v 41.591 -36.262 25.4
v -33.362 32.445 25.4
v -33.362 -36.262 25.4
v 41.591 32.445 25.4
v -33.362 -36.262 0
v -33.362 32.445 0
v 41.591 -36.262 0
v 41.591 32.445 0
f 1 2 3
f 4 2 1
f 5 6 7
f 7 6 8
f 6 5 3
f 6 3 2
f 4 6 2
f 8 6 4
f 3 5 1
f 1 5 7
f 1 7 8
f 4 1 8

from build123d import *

# Parameters (mm, degrees)
F0_W     = 74.953612
F0_H     = 68.707474
F1_DEPTH = 25.4
F3_DEPTH = 25.4
F5_DEPTH = 25.4
F6_R     = 11.148412
F7_DEPTH = 25.4


with BuildPart() as f1:
    # F0 (on Top) → F1 (new body)
    with BuildSketch(Plane.XY):
        with Locations((4.114518, -1.908541)):
            Rectangle(F0_W, F0_H)
    extrude(amount=F1_DEPTH)

    # F2 (on Top) → F3 (cut)
    with BuildSketch(Plane.XY):
        with BuildLine():
            ThreePointArc((-26.174275, 15.169183), (0.596139, 6.733711), (28.553754, 9.220484))
            ThreePointArc((28.553754, 9.220484), (1.973893, 19.409044), (-26.174275, 15.169183))
        make_face()
    extrude(amount=-F3_DEPTH, mode=Mode.SUBTRACT)

    # F4 (on Top) → F5 (join)
    with BuildSketch(Plane.XY):
        Polygon((-5.488566, 3.637098), (-12.357531, 26.304687), (-28.553756, 9.022194), align=None)
    extrude(amount=F5_DEPTH)

    # F6 (on Top) → F7 (cut)
    with BuildSketch(Plane.XY):
        with Locations((-17.846096, 15.169183)):
            Circle(F6_R)
    extrude(amount=-F7_DEPTH, mode=Mode.SUBTRACT)


solid = f1.part
